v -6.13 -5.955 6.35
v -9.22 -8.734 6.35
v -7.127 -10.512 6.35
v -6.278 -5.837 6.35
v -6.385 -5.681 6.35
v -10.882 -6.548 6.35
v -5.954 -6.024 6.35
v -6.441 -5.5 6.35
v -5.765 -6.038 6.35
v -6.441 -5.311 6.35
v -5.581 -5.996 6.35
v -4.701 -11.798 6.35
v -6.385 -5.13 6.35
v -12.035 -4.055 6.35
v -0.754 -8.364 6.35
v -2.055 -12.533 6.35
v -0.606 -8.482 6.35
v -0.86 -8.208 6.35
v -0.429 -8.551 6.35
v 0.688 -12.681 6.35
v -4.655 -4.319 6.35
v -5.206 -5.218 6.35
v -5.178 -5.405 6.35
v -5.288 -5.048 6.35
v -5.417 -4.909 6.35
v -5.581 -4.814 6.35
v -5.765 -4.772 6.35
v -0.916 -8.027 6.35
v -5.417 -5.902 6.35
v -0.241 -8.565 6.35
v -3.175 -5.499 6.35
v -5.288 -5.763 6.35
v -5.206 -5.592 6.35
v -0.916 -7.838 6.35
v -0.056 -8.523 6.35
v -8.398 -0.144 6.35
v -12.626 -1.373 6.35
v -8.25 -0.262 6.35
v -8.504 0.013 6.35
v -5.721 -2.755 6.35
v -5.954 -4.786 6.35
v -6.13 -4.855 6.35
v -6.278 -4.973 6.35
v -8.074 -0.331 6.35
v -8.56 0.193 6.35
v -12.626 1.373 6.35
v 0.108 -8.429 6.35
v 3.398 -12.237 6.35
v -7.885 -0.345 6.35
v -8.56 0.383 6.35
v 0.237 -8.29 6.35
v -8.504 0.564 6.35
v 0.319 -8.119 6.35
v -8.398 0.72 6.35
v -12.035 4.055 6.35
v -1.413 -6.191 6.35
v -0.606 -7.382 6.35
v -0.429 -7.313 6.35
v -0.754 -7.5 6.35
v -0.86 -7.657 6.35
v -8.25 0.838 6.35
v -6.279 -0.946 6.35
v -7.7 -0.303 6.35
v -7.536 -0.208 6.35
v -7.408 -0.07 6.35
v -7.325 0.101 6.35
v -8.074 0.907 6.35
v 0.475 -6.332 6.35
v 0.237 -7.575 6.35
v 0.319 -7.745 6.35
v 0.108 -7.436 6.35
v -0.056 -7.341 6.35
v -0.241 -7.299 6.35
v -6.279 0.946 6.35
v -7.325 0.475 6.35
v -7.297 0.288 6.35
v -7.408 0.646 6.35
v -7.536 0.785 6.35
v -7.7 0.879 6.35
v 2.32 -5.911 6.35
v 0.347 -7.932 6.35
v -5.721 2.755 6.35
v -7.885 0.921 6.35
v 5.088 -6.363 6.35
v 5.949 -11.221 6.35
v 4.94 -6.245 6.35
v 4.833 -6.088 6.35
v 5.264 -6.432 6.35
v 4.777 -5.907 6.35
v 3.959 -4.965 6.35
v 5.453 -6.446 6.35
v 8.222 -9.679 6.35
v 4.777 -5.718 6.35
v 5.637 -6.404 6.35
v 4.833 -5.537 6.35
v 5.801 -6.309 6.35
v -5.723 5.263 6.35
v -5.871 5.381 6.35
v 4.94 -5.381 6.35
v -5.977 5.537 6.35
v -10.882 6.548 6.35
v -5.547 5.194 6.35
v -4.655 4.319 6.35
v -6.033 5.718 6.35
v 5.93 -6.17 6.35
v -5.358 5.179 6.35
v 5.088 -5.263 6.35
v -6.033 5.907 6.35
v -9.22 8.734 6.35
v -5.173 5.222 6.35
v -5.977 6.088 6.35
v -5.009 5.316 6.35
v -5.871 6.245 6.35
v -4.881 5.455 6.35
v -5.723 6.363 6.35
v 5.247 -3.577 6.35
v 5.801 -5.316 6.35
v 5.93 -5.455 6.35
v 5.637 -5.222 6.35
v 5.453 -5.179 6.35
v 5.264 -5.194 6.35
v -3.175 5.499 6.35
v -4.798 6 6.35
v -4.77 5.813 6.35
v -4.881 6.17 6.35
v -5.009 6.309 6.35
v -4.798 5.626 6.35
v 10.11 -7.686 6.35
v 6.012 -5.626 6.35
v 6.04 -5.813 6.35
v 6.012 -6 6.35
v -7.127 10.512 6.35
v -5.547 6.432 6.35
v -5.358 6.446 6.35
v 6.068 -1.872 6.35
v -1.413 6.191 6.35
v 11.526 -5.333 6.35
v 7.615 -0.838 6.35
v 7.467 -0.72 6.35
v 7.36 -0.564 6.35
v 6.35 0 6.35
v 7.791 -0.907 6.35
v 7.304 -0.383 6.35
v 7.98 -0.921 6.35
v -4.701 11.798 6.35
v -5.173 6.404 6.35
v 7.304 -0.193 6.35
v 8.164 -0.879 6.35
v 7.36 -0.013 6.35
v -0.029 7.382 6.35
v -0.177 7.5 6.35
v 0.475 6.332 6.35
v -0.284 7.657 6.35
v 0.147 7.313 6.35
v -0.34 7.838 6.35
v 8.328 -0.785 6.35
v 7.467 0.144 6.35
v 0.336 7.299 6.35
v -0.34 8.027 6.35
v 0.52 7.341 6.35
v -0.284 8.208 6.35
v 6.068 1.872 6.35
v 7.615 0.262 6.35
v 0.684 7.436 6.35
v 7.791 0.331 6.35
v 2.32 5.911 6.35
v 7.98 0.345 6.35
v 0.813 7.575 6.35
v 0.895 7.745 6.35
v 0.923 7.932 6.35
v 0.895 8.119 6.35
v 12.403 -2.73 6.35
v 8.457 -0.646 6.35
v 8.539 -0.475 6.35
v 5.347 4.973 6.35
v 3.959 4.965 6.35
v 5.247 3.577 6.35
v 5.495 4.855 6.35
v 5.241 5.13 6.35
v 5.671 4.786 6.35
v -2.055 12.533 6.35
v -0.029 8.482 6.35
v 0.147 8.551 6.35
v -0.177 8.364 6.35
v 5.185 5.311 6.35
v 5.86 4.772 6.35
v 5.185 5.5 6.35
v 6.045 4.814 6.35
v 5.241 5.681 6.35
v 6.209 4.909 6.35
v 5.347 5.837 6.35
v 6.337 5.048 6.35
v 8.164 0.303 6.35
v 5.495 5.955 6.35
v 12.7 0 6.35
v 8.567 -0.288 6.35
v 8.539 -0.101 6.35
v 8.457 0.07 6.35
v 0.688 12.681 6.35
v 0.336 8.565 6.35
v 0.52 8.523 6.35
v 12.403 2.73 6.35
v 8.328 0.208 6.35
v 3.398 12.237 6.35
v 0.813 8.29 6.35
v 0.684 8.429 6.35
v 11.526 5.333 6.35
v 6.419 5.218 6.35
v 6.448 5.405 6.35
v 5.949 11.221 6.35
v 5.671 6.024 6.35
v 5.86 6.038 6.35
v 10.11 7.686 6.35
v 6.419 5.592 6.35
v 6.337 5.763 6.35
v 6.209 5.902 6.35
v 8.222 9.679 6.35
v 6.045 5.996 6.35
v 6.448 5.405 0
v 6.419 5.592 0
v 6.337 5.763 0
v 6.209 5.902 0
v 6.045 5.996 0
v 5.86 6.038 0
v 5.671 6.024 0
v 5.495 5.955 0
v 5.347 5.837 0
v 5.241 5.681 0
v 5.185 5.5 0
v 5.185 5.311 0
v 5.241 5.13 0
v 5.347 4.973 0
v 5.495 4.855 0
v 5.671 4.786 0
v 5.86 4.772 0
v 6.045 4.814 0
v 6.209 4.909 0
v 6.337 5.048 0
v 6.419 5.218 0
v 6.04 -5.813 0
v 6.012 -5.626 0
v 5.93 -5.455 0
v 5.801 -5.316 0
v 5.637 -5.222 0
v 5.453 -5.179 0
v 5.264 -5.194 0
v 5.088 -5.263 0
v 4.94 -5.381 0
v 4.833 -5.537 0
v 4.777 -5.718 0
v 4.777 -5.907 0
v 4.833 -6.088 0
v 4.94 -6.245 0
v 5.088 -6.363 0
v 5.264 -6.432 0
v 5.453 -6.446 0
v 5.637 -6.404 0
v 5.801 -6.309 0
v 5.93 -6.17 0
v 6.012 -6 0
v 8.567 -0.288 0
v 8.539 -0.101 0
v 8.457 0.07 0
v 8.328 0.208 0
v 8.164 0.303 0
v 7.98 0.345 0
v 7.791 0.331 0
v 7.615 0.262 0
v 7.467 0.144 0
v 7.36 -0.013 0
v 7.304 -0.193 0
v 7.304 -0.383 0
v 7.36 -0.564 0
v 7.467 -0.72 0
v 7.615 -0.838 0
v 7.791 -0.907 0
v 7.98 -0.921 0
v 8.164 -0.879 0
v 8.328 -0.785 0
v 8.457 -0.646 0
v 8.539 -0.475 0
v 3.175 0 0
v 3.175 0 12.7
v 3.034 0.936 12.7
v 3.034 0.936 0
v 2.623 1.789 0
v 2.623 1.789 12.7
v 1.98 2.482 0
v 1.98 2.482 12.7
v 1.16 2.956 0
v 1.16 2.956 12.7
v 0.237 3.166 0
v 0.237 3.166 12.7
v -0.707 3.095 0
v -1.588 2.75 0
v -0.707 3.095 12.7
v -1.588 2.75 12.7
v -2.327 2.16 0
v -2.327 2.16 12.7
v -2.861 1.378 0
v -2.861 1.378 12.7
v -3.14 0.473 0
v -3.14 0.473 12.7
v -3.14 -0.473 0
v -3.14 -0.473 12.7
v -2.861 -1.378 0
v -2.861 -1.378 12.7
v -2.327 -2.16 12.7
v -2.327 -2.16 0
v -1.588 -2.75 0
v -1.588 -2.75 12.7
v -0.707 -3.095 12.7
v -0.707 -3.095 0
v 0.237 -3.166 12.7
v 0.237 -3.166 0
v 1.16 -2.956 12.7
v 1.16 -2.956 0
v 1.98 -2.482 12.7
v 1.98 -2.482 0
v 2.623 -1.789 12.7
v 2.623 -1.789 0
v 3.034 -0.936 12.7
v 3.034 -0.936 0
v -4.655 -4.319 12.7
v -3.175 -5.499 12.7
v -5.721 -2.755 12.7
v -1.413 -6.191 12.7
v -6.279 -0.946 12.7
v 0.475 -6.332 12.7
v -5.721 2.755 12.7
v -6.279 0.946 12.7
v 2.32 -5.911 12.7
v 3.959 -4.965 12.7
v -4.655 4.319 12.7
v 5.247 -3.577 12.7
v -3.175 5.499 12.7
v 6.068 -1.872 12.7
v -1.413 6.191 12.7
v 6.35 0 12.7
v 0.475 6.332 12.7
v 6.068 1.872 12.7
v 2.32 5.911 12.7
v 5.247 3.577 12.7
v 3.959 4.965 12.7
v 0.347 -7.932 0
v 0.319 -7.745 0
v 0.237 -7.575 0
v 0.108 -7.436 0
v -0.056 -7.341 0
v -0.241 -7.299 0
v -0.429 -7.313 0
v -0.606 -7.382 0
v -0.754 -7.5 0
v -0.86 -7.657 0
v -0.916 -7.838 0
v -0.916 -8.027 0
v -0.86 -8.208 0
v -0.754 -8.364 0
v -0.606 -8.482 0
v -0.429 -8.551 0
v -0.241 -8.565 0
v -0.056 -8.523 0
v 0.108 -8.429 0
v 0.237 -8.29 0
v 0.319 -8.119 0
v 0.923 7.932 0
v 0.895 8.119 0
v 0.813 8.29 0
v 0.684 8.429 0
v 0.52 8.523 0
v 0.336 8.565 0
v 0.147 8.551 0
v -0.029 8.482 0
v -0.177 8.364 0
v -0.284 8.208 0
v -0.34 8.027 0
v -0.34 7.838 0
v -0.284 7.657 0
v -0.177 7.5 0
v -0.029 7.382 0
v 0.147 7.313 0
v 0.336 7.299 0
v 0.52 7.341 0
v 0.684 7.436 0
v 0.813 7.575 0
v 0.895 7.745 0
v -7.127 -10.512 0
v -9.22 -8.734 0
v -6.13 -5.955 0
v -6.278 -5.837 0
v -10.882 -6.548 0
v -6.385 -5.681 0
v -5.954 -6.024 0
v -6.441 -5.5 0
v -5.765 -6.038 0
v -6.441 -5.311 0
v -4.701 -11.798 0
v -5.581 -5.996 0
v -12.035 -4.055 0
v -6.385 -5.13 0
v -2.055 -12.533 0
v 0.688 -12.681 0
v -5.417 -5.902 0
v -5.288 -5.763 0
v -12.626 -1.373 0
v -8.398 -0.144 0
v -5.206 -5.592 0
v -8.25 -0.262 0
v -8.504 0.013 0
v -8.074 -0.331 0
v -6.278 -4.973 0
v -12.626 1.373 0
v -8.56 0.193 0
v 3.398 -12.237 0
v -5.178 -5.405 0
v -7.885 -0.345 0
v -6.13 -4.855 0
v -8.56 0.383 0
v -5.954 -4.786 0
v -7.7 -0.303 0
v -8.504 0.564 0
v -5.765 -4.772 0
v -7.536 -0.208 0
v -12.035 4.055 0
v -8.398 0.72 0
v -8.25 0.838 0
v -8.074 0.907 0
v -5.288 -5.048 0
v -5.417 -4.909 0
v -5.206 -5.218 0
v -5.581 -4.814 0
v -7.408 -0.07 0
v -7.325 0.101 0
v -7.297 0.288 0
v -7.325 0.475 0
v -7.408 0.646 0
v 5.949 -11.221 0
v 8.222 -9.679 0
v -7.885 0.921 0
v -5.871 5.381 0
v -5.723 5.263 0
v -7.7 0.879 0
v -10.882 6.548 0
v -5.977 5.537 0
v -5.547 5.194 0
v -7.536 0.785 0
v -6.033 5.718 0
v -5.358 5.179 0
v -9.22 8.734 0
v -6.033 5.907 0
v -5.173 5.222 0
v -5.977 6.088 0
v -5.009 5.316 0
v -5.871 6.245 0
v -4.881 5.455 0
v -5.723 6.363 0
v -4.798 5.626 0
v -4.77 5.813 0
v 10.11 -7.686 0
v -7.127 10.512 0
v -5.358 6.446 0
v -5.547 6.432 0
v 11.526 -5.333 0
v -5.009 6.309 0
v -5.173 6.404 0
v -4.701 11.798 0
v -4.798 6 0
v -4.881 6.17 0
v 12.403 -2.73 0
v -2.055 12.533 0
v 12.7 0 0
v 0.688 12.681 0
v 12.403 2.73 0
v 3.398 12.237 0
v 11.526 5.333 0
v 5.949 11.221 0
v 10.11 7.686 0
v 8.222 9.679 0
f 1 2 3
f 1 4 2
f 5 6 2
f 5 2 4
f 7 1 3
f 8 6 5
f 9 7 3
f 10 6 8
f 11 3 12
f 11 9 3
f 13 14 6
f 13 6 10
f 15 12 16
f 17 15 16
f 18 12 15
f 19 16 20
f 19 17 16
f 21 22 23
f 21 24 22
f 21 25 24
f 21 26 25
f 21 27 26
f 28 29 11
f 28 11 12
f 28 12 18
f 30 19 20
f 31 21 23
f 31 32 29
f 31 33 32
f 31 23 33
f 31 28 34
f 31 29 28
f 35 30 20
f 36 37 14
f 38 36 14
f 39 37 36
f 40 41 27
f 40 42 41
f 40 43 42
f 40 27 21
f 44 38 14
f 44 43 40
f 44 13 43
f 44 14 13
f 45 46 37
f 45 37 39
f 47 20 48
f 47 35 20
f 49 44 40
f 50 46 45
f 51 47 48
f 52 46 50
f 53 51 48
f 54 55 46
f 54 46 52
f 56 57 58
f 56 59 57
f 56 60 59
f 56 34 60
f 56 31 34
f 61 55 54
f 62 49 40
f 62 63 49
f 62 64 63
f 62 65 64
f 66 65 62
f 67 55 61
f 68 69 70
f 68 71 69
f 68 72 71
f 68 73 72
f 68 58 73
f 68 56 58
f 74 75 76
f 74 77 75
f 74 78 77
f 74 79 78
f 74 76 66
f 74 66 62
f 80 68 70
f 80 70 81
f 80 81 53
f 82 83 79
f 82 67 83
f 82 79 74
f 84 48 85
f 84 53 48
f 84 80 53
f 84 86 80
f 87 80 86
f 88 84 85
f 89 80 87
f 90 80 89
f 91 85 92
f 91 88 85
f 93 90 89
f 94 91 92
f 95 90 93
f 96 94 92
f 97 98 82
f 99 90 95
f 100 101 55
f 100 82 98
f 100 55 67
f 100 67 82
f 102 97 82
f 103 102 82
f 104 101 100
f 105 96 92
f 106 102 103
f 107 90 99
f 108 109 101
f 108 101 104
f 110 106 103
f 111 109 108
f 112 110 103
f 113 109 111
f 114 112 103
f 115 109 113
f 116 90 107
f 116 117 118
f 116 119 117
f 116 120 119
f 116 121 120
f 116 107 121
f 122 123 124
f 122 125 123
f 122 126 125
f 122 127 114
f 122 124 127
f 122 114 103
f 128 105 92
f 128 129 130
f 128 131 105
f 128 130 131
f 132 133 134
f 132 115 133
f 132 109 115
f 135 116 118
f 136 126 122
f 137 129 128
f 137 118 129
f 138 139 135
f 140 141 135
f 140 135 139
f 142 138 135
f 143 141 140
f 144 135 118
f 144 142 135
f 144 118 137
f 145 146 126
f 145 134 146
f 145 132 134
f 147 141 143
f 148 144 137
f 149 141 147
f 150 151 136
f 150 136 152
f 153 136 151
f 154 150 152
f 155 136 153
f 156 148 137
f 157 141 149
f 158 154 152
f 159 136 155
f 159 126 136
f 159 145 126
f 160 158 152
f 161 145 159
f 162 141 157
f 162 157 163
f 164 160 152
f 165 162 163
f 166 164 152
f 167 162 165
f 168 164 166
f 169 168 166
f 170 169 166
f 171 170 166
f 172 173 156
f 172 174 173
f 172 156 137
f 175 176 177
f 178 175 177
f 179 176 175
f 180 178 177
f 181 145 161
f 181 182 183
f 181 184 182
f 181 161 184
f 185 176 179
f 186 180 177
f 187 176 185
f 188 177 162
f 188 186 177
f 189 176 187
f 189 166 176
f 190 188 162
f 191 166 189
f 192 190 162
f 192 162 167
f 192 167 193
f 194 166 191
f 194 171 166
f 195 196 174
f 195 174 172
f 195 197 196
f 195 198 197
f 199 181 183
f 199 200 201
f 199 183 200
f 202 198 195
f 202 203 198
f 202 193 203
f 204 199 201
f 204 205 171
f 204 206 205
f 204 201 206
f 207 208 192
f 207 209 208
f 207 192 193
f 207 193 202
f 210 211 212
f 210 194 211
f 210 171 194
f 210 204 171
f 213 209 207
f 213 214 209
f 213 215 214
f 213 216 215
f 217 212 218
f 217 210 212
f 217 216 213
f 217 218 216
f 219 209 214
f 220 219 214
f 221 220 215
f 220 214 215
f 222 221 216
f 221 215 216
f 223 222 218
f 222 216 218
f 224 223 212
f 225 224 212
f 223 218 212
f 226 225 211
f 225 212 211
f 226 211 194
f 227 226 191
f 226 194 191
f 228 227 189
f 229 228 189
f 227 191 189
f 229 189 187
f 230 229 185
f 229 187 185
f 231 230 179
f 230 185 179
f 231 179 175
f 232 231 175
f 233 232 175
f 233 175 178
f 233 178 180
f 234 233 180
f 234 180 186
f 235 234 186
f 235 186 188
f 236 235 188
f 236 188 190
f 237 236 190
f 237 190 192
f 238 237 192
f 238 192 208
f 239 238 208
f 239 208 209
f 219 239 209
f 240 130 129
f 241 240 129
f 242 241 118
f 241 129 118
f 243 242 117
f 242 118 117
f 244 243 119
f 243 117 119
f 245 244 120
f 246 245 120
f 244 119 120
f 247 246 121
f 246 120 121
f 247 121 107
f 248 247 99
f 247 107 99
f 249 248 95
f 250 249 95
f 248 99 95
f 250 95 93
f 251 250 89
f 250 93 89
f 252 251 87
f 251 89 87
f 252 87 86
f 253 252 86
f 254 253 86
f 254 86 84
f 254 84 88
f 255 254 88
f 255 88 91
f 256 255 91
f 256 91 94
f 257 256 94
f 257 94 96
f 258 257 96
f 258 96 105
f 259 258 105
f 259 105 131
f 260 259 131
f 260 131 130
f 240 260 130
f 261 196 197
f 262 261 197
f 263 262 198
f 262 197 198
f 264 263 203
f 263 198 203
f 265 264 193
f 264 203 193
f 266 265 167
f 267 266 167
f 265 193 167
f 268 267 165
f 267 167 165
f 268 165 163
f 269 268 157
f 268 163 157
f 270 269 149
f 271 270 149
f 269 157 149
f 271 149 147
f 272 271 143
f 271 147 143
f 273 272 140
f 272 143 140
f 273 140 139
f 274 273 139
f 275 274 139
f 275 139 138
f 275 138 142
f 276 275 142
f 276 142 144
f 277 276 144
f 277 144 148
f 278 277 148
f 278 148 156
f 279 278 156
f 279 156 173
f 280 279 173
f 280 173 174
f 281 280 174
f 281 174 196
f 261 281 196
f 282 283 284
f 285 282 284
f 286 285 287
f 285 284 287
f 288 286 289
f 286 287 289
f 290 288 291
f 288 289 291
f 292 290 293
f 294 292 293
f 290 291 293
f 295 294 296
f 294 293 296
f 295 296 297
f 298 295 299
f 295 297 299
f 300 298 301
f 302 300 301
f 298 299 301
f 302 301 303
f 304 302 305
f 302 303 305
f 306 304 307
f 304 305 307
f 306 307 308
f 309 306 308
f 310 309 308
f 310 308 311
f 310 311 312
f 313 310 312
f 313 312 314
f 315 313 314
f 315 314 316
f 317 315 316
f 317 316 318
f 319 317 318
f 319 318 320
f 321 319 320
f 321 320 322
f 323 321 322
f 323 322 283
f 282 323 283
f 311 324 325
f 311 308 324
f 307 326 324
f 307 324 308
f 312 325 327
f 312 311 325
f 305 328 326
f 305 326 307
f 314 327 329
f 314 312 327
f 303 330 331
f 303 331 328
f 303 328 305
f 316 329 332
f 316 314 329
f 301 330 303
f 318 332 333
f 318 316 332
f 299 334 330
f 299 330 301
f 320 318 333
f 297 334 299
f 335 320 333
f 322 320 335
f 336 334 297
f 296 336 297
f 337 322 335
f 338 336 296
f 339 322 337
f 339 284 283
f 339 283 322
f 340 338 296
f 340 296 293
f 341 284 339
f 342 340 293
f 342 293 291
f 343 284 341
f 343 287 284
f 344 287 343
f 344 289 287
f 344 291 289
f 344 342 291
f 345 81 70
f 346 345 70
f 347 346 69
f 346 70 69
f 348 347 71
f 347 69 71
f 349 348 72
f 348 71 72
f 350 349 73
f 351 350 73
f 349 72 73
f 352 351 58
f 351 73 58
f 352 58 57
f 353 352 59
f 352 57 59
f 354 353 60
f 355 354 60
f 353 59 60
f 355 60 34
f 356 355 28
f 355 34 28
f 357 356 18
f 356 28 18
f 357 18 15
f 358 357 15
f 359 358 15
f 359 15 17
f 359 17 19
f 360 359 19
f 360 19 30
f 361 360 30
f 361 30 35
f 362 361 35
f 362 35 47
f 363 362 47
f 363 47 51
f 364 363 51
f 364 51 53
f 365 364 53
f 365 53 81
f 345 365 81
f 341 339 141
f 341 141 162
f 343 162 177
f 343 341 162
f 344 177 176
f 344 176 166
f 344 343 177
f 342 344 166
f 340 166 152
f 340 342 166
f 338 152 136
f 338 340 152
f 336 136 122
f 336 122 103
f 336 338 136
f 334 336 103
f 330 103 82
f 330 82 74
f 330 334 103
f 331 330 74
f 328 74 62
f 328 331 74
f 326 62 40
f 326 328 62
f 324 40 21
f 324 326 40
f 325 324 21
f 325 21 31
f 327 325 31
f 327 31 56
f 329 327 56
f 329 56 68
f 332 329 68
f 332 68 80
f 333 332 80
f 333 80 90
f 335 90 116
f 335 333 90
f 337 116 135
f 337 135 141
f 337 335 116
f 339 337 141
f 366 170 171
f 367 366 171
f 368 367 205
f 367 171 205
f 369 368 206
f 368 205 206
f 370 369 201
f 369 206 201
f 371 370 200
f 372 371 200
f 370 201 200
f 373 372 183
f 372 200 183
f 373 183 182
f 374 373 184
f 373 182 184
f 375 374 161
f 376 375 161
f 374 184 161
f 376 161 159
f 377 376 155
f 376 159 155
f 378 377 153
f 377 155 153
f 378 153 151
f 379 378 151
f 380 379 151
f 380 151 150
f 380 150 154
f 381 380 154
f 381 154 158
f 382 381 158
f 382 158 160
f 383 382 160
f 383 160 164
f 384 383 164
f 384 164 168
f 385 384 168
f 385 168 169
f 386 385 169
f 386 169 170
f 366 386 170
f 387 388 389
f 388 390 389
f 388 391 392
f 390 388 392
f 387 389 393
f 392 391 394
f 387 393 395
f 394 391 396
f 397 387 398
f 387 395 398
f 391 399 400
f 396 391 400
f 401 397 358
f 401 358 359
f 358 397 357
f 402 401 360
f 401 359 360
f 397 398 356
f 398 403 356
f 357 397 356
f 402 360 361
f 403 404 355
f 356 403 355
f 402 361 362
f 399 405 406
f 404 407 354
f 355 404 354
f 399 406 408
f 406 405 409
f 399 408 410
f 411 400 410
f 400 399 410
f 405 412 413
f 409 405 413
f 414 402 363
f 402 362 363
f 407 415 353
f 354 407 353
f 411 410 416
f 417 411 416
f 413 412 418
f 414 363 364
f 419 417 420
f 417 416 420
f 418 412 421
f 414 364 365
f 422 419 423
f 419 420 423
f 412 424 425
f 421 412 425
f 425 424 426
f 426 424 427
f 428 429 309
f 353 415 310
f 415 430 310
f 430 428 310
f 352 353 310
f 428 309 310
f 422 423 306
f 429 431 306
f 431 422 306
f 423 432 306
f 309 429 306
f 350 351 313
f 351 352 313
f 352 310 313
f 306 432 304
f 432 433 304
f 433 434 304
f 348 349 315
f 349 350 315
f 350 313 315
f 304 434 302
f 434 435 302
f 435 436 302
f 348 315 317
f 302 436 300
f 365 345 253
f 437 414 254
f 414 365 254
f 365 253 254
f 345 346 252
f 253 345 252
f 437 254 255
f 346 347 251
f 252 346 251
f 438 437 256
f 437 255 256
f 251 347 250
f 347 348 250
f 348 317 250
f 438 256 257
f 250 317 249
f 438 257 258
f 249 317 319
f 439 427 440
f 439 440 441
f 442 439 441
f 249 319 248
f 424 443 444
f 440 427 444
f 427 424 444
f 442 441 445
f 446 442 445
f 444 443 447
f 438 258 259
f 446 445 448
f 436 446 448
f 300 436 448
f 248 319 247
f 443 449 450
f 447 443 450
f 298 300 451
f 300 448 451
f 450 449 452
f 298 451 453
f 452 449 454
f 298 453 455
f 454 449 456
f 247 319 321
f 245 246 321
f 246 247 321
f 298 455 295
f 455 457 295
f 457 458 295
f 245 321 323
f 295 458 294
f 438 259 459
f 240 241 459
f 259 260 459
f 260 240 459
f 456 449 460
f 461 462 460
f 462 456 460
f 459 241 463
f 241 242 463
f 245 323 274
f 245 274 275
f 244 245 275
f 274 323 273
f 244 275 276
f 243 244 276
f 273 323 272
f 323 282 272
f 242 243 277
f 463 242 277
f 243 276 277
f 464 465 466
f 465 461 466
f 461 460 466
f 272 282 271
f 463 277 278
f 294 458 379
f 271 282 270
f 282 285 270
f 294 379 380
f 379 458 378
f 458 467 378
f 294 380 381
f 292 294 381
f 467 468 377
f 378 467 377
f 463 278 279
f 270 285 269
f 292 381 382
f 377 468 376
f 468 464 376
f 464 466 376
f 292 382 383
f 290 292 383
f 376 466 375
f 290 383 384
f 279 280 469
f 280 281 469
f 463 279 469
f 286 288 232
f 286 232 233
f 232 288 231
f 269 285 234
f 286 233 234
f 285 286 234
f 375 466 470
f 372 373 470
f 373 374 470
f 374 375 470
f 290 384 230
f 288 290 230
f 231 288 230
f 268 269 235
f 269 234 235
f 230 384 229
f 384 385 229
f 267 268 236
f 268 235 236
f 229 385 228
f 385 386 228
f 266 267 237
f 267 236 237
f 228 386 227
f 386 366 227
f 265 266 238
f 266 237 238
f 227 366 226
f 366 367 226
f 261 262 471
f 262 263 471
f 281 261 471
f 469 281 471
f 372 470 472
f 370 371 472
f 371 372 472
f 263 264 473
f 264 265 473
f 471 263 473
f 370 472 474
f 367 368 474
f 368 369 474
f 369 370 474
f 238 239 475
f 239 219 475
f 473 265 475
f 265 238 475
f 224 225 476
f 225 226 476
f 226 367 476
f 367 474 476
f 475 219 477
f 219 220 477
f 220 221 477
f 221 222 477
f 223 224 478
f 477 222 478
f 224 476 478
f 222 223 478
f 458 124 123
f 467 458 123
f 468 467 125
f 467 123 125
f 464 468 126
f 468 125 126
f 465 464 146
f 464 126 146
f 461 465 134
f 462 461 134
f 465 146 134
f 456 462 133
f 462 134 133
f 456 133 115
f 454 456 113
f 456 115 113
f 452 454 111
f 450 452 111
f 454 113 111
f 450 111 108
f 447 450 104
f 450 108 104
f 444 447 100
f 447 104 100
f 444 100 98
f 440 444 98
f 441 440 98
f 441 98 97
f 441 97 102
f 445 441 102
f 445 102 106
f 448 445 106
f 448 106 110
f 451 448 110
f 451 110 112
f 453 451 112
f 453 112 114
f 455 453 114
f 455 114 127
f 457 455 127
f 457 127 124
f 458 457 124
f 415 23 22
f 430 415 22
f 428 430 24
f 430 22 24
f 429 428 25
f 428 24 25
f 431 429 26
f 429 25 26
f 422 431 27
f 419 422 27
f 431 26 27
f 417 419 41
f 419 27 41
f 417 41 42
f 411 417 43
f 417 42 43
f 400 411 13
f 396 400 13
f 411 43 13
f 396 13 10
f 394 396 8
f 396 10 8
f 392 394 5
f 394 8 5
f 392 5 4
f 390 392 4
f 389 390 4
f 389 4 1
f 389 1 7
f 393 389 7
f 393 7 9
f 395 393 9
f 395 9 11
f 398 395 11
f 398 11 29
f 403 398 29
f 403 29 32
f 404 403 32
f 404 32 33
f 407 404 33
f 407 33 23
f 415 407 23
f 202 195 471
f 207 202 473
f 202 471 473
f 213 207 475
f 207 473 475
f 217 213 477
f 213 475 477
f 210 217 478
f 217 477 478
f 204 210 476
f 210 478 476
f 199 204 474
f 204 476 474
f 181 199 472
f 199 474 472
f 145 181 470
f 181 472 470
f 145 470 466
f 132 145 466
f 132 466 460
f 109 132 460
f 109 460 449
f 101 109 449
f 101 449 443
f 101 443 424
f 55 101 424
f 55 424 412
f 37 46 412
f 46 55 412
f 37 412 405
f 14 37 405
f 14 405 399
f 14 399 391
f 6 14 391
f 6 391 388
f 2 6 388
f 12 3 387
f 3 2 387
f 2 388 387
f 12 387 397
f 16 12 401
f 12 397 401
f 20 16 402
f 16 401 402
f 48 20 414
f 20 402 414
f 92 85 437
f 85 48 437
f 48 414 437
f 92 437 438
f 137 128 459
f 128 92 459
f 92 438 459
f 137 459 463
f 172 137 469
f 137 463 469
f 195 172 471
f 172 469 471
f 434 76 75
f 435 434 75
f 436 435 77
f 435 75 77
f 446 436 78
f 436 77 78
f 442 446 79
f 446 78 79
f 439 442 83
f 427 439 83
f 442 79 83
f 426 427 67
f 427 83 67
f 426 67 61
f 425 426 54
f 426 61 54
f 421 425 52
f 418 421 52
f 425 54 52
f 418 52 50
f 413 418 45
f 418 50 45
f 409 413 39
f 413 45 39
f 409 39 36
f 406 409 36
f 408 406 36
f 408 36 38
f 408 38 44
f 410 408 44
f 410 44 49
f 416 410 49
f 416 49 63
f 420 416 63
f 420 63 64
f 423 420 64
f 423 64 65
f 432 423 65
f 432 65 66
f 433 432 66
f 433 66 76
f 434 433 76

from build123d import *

# Parameters (mm, degrees)
SKETCH1_R           = 12.7
BOSS_EXTRUDE1_DEPTH = 12.7
SKETCH2_R           = 3.175
CUT_EXTRUDE1_DEPTH  = 22.997045256
SKETCH3_R           = 15.493591624
SKETCH3_R_2         = 6.35
CUT_EXTRUDE2_DEPTH  = 6.35
SKETCH4_R           = 0.635
CUT_EXTRUDE3_DEPTH  = 20.05


with BuildPart() as part:
    # Sketch1 → Boss-Extrude1 (new body)
    with BuildSketch(Plane.XY):
        Circle(SKETCH1_R)
    extrude(amount=BOSS_EXTRUDE1_DEPTH)

    # Sketch2 → Cut-Extrude1 (cut, through all)
    with BuildSketch(Plane.XY.offset(12.7)):
        Circle(SKETCH2_R)
    extrude(amount=-CUT_EXTRUDE1_DEPTH, mode=Mode.SUBTRACT)

    # Sketch3 → Cut-Extrude2 (cut)
    with BuildSketch(Plane.XY.offset(12.7)):
        Circle(SKETCH3_R)
        Circle(SKETCH3_R_2, mode=Mode.SUBTRACT)
    extrude(amount=-CUT_EXTRUDE2_DEPTH, mode=Mode.SUBTRACT)

    # Sketch4 → Cut-Extrude3 (cut, through all)
    with BuildSketch(Plane.XY.offset(6.35)):
        with Locations((0.288137957, 7.93226845)):
            Circle(SKETCH4_R)
        with Locations((5.812705114, 5.405216508)):
            Circle(SKETCH4_R)
        with Locations((7.93226845, -0.288137957)):
            Circle(SKETCH4_R)
        with Locations((5.405216508, -5.812705114)):
            Circle(SKETCH4_R)
        with Locations((-0.288137957, -7.93226845)):
            Circle(SKETCH4_R)
        with Locations((-5.812705114, -5.405216508)):
            Circle(SKETCH4_R)
        with Locations((-7.93226845, 0.288137957)):
            Circle(SKETCH4_R)
        with Locations((-5.405216508, 5.812705114)):
            Circle(SKETCH4_R)
    extrude(amount=-CUT_EXTRUDE3_DEPTH, mode=Mode.SUBTRACT)


solid = part.part
